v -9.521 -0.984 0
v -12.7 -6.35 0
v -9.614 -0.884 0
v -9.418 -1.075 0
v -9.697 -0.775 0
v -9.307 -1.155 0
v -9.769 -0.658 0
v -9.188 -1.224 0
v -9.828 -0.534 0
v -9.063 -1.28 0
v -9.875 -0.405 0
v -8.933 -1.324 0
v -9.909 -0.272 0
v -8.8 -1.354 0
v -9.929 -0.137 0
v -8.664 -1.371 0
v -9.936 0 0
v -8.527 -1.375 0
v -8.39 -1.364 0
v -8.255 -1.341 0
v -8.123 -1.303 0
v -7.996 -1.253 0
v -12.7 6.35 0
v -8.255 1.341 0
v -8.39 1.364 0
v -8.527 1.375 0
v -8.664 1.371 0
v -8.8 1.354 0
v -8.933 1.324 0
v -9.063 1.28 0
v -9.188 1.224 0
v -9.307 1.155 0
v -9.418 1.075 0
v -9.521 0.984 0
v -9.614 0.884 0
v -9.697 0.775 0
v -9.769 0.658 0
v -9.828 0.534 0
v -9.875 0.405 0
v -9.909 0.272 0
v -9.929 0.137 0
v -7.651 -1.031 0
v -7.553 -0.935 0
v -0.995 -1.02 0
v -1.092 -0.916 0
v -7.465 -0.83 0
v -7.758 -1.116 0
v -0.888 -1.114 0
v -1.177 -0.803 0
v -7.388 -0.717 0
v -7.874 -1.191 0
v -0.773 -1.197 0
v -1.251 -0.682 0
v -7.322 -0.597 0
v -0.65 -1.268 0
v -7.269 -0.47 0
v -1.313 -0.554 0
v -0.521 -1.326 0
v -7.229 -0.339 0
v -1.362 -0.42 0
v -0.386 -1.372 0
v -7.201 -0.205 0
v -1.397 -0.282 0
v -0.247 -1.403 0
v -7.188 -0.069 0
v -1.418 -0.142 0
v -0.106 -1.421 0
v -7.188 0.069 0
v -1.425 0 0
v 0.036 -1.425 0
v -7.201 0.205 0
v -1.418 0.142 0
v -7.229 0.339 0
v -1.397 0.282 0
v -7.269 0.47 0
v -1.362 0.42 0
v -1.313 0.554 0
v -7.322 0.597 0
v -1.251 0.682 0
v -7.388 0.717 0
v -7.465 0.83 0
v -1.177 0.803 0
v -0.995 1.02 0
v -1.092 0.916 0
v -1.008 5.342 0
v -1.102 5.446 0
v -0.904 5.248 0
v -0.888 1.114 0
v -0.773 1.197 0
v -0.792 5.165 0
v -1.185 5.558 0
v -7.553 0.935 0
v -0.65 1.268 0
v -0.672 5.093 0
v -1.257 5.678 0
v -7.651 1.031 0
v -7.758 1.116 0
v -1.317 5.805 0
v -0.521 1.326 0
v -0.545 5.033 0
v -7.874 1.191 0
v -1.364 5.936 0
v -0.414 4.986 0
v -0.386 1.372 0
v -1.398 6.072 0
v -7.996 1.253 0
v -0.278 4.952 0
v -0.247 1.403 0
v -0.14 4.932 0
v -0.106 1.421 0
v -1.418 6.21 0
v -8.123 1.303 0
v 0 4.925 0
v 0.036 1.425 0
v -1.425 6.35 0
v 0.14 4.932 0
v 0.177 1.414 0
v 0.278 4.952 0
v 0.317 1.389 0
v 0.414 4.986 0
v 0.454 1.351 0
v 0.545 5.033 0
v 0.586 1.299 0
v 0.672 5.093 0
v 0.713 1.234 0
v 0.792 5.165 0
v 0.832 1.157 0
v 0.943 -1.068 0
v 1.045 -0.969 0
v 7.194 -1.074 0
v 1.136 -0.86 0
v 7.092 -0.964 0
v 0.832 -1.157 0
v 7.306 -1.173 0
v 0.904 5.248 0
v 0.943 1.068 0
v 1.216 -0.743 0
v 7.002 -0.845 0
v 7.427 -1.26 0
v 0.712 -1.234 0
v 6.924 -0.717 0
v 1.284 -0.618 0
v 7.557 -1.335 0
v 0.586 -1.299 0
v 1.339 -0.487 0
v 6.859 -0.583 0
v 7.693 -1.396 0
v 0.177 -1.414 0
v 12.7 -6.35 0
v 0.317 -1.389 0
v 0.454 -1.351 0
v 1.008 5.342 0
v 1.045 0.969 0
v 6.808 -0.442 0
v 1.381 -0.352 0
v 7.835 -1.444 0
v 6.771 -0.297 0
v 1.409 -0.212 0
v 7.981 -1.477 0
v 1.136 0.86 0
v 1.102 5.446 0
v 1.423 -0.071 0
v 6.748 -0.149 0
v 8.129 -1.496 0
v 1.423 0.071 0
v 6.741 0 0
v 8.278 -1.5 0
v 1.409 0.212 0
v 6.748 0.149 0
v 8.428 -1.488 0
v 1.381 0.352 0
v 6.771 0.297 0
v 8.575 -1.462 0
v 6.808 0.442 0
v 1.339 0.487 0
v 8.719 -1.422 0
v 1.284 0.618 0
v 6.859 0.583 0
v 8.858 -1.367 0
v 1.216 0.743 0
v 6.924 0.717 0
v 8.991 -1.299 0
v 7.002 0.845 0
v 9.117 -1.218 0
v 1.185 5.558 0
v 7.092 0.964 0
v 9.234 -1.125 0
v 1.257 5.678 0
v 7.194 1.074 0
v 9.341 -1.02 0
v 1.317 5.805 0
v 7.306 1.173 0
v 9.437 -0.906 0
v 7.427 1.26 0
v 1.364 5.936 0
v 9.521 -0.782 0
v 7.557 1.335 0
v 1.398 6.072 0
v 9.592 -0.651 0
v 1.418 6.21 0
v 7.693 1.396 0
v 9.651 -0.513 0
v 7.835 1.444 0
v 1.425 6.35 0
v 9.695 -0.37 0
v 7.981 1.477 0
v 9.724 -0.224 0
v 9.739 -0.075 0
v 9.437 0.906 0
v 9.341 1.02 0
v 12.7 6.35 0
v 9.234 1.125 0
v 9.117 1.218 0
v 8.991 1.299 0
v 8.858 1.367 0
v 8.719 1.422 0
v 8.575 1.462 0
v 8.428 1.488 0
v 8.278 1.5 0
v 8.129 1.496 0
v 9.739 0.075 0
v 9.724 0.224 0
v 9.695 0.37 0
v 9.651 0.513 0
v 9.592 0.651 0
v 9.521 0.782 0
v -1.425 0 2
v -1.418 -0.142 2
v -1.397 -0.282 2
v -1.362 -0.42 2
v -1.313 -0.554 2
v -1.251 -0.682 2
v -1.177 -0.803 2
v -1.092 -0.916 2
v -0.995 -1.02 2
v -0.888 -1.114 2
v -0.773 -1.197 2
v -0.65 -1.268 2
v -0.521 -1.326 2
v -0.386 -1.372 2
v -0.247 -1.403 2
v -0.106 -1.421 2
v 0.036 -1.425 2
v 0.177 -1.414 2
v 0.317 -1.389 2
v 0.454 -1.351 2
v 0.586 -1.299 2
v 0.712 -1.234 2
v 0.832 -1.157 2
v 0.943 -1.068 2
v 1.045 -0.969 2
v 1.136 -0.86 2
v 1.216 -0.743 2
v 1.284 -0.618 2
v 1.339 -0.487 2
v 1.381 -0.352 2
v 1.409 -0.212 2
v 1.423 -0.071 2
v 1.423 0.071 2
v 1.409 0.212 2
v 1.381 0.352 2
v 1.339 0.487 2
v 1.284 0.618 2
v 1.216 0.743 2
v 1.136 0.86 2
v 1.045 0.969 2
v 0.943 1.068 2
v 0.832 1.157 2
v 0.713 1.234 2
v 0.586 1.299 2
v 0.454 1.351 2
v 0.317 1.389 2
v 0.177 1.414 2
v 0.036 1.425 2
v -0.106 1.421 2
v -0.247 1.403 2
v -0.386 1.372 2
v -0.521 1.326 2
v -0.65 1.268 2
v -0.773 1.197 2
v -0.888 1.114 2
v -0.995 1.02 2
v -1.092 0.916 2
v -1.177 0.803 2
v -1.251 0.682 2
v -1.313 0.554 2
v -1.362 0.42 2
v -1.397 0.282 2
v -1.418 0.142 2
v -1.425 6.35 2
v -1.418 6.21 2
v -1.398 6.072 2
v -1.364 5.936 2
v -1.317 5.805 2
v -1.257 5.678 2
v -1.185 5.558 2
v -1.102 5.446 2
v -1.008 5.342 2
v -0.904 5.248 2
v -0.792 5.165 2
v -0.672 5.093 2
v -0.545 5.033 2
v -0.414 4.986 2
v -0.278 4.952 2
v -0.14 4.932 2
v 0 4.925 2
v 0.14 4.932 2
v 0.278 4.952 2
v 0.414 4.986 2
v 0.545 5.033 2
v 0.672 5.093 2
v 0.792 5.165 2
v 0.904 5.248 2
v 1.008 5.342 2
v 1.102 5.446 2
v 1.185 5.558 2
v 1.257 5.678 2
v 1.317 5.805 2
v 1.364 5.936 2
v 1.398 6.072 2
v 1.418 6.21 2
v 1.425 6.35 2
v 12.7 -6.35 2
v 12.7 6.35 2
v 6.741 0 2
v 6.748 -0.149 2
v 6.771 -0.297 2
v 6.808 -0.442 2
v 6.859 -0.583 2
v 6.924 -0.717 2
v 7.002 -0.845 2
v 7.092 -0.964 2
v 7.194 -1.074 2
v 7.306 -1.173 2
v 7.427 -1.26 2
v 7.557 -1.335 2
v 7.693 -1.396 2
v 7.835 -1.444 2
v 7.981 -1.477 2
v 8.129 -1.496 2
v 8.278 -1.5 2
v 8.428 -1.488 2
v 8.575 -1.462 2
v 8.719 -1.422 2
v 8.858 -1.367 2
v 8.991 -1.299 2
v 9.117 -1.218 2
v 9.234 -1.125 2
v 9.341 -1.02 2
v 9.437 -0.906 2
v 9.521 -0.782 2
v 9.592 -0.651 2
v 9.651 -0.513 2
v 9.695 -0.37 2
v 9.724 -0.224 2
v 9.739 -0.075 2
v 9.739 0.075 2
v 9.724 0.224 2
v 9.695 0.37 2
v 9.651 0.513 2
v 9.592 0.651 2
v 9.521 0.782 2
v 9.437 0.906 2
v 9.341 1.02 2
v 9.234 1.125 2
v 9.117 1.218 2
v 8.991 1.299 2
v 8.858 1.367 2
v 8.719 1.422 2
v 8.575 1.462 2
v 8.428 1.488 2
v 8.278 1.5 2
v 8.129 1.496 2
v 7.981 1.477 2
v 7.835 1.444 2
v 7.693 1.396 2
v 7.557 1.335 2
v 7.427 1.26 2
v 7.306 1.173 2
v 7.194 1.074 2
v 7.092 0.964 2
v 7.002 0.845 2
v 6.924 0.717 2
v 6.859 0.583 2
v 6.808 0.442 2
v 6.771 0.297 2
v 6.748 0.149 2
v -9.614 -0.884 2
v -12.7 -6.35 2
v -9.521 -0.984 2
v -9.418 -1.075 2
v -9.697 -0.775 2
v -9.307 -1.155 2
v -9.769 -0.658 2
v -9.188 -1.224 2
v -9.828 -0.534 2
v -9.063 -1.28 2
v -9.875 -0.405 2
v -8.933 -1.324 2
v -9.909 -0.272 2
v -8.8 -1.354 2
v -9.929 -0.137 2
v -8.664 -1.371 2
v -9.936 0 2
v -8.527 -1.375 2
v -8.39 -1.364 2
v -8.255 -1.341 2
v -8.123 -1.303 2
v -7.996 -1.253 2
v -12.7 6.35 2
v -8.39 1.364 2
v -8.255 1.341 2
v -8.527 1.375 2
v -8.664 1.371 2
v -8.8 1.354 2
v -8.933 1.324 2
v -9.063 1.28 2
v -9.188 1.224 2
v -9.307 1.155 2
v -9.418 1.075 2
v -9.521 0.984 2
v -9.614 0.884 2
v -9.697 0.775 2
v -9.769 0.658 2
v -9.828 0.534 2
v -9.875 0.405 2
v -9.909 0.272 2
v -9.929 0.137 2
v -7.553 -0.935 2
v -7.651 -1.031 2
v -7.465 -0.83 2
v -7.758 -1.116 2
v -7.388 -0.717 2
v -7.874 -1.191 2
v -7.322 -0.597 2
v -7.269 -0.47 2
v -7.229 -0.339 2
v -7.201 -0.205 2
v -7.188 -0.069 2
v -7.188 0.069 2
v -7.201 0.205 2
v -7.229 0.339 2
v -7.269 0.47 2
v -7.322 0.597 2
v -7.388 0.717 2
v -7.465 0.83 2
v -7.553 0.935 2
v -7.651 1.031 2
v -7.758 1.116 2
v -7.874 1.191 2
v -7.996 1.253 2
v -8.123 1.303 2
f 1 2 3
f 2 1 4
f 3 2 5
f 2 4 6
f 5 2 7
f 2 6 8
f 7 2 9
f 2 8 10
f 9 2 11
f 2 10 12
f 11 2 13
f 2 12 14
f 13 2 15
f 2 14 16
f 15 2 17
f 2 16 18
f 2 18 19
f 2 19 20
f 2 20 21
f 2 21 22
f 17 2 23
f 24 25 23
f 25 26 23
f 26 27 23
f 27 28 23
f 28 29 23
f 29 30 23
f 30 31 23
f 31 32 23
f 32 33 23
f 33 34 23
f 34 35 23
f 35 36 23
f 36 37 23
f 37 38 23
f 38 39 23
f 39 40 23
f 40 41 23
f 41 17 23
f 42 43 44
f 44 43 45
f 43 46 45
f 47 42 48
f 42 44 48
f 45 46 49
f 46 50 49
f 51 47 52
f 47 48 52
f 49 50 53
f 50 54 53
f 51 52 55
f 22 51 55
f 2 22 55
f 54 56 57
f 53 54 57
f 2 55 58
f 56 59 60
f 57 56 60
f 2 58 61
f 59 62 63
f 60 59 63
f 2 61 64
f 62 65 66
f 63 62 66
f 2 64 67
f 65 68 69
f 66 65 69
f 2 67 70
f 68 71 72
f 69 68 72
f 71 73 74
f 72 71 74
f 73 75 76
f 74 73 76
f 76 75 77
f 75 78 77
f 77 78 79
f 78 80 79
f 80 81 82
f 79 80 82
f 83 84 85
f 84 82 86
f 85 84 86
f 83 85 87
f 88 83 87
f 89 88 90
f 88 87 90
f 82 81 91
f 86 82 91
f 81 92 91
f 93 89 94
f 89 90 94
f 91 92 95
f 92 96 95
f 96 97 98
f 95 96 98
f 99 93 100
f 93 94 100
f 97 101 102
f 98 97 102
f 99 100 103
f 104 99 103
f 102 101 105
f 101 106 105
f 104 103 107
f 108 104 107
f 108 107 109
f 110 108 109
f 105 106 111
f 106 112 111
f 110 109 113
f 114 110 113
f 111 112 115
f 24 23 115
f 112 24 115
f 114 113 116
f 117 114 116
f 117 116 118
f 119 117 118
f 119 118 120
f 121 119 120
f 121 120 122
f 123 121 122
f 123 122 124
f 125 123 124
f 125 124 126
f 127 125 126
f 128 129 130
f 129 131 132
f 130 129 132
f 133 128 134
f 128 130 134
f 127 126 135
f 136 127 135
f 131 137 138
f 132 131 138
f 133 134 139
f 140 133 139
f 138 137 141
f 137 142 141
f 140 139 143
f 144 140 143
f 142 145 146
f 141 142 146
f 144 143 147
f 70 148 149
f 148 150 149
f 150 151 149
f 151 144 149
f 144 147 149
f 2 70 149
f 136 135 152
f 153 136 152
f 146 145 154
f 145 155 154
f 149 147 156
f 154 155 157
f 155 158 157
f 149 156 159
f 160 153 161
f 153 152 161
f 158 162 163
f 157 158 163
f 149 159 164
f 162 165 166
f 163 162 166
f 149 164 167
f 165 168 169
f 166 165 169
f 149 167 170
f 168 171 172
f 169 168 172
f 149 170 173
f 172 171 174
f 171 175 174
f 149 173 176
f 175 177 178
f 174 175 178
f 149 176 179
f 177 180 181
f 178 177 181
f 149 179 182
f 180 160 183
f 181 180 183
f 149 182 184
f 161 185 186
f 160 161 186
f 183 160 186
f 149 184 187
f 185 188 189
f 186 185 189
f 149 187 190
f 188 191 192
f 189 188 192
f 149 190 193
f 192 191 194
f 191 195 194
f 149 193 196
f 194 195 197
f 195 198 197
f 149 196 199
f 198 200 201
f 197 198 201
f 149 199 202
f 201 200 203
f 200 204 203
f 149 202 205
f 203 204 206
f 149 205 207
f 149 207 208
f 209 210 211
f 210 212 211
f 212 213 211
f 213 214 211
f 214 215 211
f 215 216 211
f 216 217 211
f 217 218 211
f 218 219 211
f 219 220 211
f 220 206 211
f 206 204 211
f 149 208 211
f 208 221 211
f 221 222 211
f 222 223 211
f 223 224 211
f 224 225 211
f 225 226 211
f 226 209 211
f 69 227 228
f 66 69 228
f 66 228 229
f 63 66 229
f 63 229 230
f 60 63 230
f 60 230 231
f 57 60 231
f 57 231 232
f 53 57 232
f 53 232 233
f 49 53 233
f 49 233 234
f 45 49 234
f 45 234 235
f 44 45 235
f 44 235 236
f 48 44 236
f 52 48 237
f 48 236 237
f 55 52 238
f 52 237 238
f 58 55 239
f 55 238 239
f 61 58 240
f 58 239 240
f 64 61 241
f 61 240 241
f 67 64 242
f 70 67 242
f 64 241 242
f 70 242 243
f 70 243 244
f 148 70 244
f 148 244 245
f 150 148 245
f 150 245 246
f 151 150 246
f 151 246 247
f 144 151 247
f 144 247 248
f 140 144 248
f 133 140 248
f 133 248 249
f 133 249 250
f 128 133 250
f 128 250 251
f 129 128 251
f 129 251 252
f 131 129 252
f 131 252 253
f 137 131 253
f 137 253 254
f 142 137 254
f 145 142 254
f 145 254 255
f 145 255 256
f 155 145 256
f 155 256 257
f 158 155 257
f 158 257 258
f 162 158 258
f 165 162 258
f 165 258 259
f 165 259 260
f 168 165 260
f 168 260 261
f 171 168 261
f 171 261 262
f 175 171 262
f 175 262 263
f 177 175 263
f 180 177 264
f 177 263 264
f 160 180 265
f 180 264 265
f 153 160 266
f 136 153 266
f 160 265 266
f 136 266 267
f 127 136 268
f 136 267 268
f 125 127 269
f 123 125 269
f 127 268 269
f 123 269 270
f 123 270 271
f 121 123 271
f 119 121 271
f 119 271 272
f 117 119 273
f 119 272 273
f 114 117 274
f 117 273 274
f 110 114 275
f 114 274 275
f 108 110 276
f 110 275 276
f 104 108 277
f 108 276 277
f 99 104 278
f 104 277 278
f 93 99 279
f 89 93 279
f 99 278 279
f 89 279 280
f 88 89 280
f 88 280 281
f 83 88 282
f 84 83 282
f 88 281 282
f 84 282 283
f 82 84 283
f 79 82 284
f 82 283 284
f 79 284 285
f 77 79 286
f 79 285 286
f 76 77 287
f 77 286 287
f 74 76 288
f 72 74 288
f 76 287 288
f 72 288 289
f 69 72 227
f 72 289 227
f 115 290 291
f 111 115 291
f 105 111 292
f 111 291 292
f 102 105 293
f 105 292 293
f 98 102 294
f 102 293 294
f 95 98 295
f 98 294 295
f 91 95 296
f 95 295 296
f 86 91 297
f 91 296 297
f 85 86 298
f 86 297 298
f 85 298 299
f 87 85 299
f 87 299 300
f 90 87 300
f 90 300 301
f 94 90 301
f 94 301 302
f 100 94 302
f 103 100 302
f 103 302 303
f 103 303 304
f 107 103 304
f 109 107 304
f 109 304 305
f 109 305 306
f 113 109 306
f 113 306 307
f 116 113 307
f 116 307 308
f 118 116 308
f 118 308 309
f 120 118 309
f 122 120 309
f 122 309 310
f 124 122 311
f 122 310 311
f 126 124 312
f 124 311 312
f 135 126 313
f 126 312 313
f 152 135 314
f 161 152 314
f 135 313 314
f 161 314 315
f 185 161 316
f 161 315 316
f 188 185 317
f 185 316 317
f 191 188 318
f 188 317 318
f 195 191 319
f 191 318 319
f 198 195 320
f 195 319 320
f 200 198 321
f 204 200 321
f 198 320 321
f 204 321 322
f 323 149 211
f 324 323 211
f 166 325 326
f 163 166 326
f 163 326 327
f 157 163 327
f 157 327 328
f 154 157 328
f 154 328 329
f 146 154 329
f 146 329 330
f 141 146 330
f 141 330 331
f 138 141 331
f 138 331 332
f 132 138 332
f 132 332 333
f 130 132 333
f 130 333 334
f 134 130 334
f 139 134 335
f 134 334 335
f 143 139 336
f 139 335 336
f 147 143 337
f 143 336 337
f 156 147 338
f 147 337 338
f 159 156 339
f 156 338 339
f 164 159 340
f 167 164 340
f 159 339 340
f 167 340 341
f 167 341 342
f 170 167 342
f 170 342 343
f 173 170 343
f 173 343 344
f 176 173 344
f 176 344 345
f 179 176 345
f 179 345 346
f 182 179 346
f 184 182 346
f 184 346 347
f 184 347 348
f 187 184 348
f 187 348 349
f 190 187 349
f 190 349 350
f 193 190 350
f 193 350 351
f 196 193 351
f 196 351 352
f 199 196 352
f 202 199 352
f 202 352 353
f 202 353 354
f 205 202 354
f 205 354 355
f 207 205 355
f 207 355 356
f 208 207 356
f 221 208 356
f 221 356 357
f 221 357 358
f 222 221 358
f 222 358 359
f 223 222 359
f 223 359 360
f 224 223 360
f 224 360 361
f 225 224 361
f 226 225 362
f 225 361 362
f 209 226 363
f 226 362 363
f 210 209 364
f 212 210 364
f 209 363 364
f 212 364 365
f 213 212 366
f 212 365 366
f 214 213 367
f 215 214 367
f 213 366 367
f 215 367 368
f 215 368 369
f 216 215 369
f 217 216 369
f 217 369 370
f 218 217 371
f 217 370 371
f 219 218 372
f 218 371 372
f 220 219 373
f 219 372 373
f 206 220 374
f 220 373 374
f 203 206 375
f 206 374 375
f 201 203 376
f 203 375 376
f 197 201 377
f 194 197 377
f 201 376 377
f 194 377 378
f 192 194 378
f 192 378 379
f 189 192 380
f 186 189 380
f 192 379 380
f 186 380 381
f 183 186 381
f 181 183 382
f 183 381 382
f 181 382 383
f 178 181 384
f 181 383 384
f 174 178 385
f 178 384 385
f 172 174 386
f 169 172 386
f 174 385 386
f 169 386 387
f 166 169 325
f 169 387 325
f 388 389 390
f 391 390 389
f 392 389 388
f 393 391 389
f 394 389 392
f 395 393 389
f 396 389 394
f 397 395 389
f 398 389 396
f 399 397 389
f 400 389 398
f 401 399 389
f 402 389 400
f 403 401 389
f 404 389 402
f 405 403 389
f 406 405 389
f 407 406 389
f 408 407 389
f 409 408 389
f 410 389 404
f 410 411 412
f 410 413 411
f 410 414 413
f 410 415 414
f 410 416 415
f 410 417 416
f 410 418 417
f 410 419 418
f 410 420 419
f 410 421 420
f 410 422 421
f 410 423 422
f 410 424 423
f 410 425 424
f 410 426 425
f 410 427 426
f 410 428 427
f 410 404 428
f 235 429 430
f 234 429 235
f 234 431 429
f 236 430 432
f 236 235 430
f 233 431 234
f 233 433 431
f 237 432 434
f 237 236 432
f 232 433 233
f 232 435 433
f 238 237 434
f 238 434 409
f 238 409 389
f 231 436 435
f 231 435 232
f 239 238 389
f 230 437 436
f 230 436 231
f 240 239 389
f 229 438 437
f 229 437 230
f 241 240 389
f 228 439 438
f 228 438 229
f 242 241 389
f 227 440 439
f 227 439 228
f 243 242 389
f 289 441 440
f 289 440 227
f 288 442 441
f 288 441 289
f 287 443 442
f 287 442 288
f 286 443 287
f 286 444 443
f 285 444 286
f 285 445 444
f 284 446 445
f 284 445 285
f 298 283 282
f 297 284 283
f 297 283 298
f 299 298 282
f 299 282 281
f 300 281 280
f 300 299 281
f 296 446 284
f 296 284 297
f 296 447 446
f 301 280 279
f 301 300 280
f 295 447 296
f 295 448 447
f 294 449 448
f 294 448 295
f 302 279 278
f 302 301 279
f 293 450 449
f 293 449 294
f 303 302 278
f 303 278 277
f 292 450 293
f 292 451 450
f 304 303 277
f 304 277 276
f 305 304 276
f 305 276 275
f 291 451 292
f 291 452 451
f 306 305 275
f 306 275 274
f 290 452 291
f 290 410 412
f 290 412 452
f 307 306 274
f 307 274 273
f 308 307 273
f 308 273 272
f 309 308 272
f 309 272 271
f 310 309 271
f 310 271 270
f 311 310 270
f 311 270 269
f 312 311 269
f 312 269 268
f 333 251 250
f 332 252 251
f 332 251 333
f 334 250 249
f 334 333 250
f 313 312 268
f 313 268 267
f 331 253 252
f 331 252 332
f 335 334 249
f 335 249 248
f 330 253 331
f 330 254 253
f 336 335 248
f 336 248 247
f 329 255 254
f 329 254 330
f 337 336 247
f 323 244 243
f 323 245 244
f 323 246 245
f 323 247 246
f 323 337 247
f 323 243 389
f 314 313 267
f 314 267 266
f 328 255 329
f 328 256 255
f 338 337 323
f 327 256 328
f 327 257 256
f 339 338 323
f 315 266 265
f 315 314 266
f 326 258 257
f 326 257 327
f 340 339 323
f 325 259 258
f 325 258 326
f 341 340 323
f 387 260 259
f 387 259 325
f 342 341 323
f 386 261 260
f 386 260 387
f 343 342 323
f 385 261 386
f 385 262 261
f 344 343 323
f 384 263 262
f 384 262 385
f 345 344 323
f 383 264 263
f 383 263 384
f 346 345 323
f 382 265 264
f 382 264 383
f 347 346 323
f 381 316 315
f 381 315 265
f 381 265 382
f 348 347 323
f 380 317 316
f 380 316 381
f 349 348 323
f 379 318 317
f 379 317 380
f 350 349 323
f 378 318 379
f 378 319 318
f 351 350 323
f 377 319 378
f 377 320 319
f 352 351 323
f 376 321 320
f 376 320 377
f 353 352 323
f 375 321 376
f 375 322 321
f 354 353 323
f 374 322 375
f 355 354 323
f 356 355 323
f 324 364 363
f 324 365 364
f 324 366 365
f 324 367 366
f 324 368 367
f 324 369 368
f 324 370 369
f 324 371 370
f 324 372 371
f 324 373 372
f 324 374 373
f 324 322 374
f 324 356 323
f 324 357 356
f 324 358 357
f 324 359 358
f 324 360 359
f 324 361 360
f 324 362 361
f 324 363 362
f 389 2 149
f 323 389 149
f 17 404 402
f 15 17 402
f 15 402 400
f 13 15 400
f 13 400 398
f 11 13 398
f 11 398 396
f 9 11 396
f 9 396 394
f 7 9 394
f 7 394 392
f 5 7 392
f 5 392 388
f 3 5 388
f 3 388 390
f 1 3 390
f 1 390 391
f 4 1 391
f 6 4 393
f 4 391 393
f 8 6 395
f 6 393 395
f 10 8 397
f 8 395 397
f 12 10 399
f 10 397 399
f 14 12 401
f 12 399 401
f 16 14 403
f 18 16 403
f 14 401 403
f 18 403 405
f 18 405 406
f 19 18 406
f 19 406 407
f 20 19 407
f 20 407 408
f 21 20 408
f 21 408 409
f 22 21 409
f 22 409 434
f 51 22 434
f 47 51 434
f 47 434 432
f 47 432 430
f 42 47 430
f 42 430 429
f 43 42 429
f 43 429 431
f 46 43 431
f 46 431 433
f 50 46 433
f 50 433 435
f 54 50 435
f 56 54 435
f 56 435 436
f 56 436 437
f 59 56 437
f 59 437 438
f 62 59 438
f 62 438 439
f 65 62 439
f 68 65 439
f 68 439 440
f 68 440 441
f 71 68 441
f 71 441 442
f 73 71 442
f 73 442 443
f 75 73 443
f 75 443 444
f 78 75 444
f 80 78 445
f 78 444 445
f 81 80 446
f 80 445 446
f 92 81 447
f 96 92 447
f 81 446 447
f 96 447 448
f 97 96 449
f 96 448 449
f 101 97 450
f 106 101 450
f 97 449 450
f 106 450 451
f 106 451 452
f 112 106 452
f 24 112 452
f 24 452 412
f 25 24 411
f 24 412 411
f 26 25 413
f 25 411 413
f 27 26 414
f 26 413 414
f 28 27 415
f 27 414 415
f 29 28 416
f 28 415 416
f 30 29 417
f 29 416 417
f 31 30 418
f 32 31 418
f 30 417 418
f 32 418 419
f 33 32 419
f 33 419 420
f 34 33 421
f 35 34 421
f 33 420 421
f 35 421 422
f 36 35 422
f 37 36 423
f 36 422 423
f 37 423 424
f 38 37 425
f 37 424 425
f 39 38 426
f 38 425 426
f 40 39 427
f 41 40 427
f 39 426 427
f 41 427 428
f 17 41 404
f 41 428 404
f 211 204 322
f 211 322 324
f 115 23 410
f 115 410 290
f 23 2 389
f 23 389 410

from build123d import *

# Parameters (mm, degrees)
F0_W     = 25.4
F0_H     = 12.7
F1_DEPTH = 2
F2_D     = 2.85
F3_D     = 3
F4_D     = 2.75


with BuildPart() as f1:
    # F0 (on Top) → F1 (new body)
    with BuildSketch(Plane.XY):
        Rectangle(F0_W, F0_H)
    extrude(amount=F1_DEPTH)

    # F2 (through all)
    with Locations(Plane(origin=(0, 0, 0), x_dir=(1, 0, 0), z_dir=(0, 0, -1))):
        with Locations((0, 0), (0, -6.35)):
            Hole(F2_D / 2)

    # F3 (through all)
    with Locations(Plane(origin=(0, 0, 0), x_dir=(1, 0, 0), z_dir=(0, 0, -1))):
        with Locations((8.2410294563, 0)):
            Hole(F3_D / 2)

    # F4 (through all)
    with Locations(Plane(origin=(0, 0, 0), x_dir=(1, 0, 0), z_dir=(0, 0, -1))):
        with Locations((-8.5610700771, 0)):
            Hole(F4_D / 2)


solid = f1.part
